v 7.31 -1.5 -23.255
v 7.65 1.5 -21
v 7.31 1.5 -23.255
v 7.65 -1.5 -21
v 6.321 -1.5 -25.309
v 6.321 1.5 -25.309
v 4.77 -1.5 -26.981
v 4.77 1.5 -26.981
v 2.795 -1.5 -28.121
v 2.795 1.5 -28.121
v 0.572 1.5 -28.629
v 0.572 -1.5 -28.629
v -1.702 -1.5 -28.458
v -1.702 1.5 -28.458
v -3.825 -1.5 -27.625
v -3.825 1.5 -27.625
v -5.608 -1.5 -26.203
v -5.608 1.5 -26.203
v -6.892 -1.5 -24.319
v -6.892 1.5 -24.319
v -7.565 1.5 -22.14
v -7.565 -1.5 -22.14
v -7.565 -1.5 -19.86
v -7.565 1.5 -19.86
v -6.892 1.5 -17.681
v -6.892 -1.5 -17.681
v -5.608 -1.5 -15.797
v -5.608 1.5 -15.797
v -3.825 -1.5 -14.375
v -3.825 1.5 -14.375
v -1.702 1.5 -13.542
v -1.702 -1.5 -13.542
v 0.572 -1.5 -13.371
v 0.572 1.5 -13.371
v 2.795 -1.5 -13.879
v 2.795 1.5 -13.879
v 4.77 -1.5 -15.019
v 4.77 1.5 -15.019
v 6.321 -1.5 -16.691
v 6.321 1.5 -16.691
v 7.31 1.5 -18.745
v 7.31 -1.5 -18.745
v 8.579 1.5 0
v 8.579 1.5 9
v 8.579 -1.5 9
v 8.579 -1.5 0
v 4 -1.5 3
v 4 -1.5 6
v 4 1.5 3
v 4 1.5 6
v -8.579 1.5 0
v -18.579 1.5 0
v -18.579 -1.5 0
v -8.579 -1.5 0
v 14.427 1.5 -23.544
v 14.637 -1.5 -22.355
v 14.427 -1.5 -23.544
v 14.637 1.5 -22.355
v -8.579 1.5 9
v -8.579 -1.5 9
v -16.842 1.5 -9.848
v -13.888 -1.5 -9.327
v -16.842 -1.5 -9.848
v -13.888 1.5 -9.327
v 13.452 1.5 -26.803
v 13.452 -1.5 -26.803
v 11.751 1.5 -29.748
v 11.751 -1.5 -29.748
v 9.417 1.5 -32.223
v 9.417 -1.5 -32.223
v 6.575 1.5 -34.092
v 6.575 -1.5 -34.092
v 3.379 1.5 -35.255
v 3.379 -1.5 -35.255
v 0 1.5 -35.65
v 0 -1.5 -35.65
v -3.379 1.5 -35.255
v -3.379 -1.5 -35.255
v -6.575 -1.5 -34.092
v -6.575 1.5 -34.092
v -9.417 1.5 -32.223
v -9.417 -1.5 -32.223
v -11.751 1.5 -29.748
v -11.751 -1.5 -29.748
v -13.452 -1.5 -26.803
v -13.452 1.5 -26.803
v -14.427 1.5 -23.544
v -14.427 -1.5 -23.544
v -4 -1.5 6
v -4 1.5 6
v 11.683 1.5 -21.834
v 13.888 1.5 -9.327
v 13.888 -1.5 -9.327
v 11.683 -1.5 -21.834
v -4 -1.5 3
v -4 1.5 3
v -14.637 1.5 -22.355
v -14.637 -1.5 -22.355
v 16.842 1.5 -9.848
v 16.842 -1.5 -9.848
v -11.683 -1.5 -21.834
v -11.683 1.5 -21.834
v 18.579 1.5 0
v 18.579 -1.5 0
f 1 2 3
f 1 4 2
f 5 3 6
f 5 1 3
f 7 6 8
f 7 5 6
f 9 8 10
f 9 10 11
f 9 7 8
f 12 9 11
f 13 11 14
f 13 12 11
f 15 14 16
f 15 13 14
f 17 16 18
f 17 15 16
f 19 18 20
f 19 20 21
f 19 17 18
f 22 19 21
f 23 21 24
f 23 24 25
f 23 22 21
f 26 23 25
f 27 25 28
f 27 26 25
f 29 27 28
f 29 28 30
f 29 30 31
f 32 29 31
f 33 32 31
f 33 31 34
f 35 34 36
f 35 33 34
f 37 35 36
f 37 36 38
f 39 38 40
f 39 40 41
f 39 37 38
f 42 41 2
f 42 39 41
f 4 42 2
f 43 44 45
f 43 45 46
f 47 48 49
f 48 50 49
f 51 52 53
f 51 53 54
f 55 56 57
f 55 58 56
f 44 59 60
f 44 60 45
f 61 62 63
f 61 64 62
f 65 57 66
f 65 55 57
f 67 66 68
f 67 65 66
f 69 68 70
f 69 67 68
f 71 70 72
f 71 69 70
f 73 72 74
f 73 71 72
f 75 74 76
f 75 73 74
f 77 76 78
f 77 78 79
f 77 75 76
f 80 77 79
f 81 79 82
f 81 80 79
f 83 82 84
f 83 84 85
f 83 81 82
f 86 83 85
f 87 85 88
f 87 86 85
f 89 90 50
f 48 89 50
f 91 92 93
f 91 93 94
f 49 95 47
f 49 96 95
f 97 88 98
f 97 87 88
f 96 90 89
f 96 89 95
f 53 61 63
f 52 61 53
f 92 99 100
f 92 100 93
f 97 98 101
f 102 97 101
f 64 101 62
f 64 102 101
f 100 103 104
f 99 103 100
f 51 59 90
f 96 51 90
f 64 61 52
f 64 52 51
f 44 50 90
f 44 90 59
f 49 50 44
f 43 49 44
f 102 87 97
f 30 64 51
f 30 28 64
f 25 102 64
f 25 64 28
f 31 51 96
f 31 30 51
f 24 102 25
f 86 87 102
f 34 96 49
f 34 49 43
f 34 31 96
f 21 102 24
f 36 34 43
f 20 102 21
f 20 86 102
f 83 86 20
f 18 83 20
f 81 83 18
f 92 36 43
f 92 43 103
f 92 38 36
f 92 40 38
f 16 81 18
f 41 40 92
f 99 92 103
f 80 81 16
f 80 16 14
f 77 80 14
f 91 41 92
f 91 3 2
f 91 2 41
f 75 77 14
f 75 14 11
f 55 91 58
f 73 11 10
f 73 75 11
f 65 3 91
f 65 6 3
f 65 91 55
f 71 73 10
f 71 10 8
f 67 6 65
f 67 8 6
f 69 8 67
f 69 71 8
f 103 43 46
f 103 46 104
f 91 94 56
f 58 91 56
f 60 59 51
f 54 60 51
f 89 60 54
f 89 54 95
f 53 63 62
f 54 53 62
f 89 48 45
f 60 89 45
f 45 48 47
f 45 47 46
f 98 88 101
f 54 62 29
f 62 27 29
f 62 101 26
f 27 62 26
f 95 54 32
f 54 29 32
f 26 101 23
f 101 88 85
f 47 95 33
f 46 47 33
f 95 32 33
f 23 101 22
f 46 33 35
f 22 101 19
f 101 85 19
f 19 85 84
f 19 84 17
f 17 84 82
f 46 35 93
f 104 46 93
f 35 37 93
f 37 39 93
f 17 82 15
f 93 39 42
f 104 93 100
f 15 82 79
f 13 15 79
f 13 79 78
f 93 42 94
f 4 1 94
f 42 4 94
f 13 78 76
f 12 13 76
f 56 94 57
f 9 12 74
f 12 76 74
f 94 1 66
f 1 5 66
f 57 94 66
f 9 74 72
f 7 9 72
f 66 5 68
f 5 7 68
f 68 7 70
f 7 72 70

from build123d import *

# Parameters (mm, degrees)
SKETCH1_R           = 7.65
SKETCH1_W           = 8
SKETCH1_H           = 3
BOSS_EXTRUDE1_DEPTH = 1.5


with BuildPart() as part:
    # Sketch1 → Boss-Extrude1 (new, symmetric)
    with BuildSketch(Plane(origin=(0, 0, 0), x_dir=(1, 0, 0), z_dir=(0, 1, 0))):
        with BuildLine():
            Line((-16.842384682, 9.84807753), (-18.578866459, 0))
            Line((-18.578866459, 0), (-8.578866459, 0))
            Line((-8.578866459, 0), (-8.578866459, -9))
            Line((-8.578866459, -9), (8.578866459, -9))
            Line((8.578866459, -9), (8.578866459, 0))
            Line((8.578866459, 0), (18.578866459, 0))
            Line((18.578866459, 0), (16.842384682, 9.84807753))
            Line((16.842384682, 9.84807753), (13.887961423, 9.327132997))
            Line((13.887961423, 9.327132997), (11.682629567, 21.83419146))
            Line((11.682629567, 21.83419146), (14.637052826, 22.355135993))
            Line((14.637052826, 22.355135993), (14.427433582, 23.543945803))
            ThreePointArc((14.427433582, 23.543945803), (0, 35.65), (-14.427433582, 23.543945803))
            Line((-14.427433582, 23.543945803), (-14.637052826, 22.355135993))
            Line((-14.637052826, 22.355135993), (-11.682629567, 21.83419146))
            Line((-11.682629567, 21.83419146), (-13.887961423, 9.327132997))
            Line((-13.887961423, 9.327132997), (-16.842384682, 9.84807753))
        make_face()
        with Locations((0, 21)):
            Circle(SKETCH1_R, mode=Mode.SUBTRACT)
        with Locations((0, -4.5)):
            Rectangle(SKETCH1_W, SKETCH1_H, mode=Mode.SUBTRACT)
    extrude(amount=BOSS_EXTRUDE1_DEPTH, both=True)


solid = part.part
